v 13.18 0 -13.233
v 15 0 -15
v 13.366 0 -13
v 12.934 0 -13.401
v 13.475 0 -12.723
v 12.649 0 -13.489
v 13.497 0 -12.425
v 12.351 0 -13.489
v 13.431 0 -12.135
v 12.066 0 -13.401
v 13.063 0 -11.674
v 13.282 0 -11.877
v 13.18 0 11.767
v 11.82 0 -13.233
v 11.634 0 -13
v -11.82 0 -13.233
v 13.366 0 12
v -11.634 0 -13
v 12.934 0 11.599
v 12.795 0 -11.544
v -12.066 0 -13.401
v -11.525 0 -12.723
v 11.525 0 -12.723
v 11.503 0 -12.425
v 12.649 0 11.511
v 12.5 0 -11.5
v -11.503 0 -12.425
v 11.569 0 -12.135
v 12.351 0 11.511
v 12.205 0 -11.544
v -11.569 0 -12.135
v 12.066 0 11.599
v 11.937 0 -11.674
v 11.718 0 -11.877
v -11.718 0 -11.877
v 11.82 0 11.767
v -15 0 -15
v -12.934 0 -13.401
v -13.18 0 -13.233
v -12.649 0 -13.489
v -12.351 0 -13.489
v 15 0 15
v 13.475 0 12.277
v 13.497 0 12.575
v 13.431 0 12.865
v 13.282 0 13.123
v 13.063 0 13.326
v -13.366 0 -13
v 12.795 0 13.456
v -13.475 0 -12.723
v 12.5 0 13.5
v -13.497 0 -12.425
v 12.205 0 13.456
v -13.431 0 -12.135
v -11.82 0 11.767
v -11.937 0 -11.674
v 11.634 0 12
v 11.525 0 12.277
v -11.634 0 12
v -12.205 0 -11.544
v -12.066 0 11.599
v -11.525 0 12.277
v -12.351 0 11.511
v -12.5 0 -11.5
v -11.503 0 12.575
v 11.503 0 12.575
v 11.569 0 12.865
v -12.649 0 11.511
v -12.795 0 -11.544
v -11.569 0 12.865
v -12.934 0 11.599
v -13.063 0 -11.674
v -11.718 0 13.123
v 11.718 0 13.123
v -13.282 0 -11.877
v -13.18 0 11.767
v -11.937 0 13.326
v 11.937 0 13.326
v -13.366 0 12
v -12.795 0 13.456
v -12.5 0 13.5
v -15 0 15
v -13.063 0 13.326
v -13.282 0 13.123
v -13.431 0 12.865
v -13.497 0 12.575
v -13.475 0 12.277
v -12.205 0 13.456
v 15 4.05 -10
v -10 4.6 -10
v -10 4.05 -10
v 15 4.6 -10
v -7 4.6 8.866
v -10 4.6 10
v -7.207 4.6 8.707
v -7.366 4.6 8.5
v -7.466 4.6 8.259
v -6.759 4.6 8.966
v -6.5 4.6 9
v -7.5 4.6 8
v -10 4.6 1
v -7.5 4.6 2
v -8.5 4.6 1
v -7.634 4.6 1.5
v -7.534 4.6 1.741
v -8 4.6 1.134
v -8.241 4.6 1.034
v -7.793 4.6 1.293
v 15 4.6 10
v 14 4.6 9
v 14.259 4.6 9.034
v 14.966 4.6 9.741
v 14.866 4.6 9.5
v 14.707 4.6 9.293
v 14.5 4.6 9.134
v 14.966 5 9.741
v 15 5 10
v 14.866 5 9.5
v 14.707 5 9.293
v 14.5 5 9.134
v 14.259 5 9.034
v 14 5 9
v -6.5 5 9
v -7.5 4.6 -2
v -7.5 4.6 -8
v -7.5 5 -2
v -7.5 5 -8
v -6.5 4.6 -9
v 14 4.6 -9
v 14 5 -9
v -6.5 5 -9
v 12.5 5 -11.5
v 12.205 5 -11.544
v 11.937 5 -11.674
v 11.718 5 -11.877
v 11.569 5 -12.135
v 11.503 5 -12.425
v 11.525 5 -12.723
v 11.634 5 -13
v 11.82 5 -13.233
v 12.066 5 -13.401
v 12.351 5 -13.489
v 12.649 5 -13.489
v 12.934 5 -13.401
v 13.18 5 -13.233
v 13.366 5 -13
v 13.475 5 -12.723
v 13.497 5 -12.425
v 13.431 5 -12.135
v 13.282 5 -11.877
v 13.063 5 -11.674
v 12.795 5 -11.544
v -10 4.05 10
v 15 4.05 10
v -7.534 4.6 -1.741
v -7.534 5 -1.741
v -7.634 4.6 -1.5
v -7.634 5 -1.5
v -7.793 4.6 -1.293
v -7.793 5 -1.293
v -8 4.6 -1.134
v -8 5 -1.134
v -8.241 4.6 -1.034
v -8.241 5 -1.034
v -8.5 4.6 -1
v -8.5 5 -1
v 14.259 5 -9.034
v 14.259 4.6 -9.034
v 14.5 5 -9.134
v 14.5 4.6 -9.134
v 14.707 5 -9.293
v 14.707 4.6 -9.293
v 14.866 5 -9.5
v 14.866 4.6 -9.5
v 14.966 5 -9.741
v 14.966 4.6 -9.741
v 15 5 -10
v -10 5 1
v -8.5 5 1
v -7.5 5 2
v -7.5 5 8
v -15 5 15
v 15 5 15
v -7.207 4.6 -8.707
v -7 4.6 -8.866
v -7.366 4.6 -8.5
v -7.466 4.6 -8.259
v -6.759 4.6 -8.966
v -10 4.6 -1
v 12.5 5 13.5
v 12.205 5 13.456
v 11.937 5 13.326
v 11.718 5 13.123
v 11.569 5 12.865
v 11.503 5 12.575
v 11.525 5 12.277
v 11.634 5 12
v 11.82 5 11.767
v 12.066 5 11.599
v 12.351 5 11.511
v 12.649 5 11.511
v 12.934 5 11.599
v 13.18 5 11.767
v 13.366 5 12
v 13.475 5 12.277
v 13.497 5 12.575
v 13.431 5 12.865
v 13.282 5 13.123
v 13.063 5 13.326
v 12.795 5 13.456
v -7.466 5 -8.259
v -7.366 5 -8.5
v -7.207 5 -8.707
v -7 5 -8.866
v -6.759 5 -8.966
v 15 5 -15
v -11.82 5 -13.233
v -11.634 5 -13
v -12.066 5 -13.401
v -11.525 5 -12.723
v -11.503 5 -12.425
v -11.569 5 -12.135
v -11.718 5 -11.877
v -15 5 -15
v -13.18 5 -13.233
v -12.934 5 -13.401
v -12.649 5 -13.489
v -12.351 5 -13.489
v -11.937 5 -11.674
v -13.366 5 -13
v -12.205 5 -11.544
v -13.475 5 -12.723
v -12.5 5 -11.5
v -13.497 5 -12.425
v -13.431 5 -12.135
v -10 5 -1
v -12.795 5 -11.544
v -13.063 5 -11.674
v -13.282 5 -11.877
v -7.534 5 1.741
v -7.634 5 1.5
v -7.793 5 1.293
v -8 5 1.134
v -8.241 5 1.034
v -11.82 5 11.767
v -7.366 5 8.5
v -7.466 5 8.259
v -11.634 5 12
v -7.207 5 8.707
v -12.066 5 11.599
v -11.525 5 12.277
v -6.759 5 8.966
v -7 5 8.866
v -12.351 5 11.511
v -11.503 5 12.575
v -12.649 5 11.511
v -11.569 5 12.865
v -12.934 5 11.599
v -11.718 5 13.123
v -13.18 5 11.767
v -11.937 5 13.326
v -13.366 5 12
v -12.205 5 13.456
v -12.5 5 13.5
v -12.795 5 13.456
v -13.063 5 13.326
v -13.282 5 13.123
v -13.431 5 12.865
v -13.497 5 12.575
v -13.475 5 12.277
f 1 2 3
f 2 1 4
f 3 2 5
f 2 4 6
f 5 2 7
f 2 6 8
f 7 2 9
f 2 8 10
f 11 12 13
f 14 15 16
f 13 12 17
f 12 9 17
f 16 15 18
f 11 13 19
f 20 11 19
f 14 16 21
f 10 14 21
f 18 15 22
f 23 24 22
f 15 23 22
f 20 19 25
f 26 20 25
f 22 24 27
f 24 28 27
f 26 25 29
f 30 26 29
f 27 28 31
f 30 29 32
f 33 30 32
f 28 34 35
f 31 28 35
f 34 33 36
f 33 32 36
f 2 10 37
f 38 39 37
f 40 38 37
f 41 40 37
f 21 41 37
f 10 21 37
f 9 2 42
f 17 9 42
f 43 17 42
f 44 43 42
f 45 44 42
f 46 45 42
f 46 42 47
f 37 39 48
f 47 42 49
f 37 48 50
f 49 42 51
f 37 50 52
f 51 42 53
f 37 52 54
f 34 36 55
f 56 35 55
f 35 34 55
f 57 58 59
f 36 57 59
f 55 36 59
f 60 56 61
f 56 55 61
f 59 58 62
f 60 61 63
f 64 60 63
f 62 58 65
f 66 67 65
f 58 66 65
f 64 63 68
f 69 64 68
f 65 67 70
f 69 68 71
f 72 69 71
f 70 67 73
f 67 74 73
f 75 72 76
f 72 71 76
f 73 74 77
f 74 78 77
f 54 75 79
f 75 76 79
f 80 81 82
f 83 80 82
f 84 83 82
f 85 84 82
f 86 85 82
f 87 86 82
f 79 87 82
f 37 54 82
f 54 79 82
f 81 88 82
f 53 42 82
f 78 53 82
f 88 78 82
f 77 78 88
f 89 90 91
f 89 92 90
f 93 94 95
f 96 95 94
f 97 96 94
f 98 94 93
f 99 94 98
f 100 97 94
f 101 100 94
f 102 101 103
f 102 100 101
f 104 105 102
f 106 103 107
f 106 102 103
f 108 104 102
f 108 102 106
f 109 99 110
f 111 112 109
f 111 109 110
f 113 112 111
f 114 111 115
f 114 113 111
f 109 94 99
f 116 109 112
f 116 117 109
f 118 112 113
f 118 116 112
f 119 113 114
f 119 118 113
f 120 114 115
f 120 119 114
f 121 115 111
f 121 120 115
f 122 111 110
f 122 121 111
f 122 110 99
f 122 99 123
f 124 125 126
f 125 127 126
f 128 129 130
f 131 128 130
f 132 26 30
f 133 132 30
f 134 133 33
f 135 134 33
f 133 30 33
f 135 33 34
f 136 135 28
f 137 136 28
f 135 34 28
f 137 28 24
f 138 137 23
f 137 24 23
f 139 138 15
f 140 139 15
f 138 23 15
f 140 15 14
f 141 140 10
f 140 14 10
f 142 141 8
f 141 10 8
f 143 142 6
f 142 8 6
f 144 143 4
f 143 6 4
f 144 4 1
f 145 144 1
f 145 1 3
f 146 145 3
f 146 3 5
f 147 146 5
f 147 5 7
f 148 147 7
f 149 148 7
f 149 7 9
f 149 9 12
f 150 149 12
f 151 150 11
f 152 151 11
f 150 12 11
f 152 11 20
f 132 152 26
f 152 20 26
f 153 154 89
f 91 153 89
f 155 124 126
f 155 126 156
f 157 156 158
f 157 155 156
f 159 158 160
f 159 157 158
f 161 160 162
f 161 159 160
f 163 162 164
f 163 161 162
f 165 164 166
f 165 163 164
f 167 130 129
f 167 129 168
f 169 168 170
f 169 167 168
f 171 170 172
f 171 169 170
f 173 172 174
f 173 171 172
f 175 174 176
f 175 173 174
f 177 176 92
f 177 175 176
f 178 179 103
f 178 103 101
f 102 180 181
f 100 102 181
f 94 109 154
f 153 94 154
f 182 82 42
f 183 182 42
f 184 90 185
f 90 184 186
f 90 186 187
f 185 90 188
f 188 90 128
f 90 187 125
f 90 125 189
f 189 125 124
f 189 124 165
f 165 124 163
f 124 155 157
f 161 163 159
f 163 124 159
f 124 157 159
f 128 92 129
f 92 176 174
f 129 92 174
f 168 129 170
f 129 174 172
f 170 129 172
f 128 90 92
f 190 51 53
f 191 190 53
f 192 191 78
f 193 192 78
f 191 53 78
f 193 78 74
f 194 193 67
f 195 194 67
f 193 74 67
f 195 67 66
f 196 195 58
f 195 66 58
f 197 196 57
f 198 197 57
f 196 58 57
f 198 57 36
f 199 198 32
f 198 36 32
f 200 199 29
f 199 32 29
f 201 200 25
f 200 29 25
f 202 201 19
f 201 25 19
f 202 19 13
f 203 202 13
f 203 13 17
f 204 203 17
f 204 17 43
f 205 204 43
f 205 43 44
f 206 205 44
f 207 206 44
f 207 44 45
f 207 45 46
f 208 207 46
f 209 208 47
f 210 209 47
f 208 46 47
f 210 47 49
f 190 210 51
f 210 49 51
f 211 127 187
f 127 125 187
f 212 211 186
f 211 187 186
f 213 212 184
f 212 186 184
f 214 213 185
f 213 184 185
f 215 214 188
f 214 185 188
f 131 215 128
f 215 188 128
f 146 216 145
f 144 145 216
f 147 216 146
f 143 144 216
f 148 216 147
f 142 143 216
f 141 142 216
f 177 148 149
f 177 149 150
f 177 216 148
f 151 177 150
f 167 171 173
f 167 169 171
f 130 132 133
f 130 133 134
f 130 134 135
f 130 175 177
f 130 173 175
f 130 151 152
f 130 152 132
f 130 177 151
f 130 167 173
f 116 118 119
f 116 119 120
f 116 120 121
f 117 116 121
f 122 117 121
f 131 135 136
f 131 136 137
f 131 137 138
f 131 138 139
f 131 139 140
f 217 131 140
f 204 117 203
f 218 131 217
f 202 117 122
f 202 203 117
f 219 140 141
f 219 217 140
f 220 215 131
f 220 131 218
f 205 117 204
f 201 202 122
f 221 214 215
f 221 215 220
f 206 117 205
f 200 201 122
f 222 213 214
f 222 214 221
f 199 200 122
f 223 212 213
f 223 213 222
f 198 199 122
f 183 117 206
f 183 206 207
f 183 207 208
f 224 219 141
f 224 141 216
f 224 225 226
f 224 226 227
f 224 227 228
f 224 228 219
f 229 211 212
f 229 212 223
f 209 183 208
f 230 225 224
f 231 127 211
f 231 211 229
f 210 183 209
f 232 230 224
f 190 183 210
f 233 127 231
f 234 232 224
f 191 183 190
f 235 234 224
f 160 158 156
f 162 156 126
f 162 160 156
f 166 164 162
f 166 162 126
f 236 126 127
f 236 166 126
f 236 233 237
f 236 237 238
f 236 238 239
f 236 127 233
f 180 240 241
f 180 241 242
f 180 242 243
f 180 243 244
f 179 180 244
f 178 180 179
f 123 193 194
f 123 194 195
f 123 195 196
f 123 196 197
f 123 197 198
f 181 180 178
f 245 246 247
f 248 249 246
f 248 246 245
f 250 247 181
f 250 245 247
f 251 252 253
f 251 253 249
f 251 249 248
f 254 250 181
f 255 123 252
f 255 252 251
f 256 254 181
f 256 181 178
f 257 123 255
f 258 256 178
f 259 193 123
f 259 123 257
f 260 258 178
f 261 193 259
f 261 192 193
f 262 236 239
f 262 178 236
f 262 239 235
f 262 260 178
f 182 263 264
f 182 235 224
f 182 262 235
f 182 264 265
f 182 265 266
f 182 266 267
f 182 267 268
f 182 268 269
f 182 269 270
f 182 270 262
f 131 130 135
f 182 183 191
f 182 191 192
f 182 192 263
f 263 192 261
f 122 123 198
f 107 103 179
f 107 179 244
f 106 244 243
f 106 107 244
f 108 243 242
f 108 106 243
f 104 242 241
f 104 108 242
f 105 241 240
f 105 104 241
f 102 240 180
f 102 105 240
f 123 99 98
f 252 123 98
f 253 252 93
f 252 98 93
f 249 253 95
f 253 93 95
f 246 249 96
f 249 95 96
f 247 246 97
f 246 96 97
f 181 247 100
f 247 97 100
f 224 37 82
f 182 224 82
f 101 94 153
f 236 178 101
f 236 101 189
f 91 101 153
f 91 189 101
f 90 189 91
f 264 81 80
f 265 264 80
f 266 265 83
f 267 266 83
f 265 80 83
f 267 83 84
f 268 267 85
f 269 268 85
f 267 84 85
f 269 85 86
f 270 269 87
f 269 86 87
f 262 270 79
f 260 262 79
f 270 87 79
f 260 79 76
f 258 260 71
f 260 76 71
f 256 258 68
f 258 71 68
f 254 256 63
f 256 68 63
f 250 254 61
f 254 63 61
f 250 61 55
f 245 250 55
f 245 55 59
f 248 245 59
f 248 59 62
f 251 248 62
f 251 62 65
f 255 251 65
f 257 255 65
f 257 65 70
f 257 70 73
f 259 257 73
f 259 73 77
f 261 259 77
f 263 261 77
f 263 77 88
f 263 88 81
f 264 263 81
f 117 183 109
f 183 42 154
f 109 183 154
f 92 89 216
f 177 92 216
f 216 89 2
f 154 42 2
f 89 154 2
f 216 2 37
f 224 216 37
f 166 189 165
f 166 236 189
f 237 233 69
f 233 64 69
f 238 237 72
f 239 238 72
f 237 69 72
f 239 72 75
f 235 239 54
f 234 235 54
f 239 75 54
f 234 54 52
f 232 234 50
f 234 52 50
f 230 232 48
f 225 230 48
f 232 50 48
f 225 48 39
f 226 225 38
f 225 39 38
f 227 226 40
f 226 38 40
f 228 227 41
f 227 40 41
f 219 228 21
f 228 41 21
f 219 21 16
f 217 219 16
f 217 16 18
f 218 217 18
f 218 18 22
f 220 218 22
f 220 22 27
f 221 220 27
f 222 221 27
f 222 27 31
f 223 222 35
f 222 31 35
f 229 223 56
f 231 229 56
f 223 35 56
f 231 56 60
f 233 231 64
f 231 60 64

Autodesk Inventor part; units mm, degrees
ref_plane "YZ Plane" through (0, 0, 0) normal (1, 0, 0) x (0, 1, 0)
ref_plane "XZ Plane" through (0, 0, 0) normal (0, 1, 0) x (-1, 0, 0)
ref_plane "XY Plane" through (0, 0, 0) normal (0, 0, 1) x (1, 0, 0)
sketch "Sketch1" plane through (0, 0, 0) normal (0, 1, 0) x (-1, 0, 0)
  line L0 (-15, -15) -> (15, -15)
  line L1 (15, -15) -> (15, 15)
  line L2 (15, 15) -> (-15, 15)
  line L3 (-15, 15) -> (-15, -15)
  line L4 (-15, -15) -> (15, 15) construction
  line L5 (15, -15) -> (-15, 15) construction
  point P0 (0, 0)
  dimension "d0" = 30
  dimension "d1" = 30
extrude "Extrusion1" add sketch "Sketch1" along normal blind 5
sketch "Sketch2" plane through (15, 0, 15) normal (1, 0, 0) x (0, 0, -1)
  line L0 (0, 5) -> (30, 5) projected
  line L1 (5, 4.05) -> (25, 4.05)
  line L2 (0, 0) -> (30, 0) projected
  line L3 (5, 4.6) -> (5, 4.05)
  line L4 (5, 4.6) -> (6, 4.6)
  line L5 (6, 4.6) -> (6, 5)
  line L6 (15, -1.7486) -> (15, 8.5822)
  line L7 (25, 4.05) -> (5, 4.05)
  line L8 (25, 4.6) -> (25, 4.05)
  line L9 (25, 4.6) -> (24, 4.6)
  line L10 (24, 4.6) -> (24, 5)
  point P0 (15, 0)
  point P1 (15, 0)
  point P2 (15, 0)
  dimension "d4" = 10
  dimension "d5" = 20
  dimension "d10" = 0.55
  dimension "d12" = 0.4
  dimension "d13" = 1
extrude "Extrusion2" cut sketch "Sketch2" against normal blind 25
sketch "Sketch3" plane through (0, 5, 0) normal (0, 1, 0) x (1, 0, 0)
  line L0 (-10, 9) -> (15, 9) projected
  line L1 (15, -9) -> (-10, -9) projected
  line L2 (-10, 9) -> (-7.5, 9)
  line L3 (-7.5, 9) -> (-7.5, -9)
  line L4 (-7.5, -9) -> (-10, -9)
  line L5 (-10, -9) -> (-10, 9)
  line L6 (-7.5, -1) -> (-10, -1)
  line L7 (-10, -1) -> (-10, 1)
  line L8 (-10, 1) -> (-7.5, 1)
  line L9 (-7.5, 1) -> (-7.5, -1)
  point P0 (0, 0)
  dimension "d16" = 2.5
  dimension "d17" = 2
  dimension "d18" = 1
extrude "Extrusion3" add sketch "Sketch3" against normal up to surface (0.4 mm away) contours L0 L3 L8 L5 | L6 L3 L1 L5
fillet "Fillet1" radius 1 6 edges at (15, 4.8, 9) (15, 4.8, -9) (-7.5, 4.8, -1) (-7.5, 4.8, 1) (-7.5, 4.8, 9) (-7.5, 4.8, -9)
sketch "Sketch4" plane through (0, 5, 0) normal (0, 1, 0) x (1, 0, 0)
  point P0 (0, 0)
  point P1 (12.5, -12.5)
  point P2 (-12.5, -12.5)
  point P3 (-12.5, 12.5)
  point P4 (12.5, 12.5)
  dimension "d22" = 25
  dimension "d23" = 12.5
  dimension "d24" = 25
  dimension "d25" = 12.5
hole "Hole1" at (12.5, 5, 12.5) at (-12.5, 5, 12.5) at (-12.5, 5, -12.5) at (12.5, 5, -12.5) direction (0, -1, 0) diameter 2 end through all
equation "\"d23\" = 0.5 * d22"
equation "\"d25\" = 0.5 * d24"
properties part number "Flex Circuit Slot"
